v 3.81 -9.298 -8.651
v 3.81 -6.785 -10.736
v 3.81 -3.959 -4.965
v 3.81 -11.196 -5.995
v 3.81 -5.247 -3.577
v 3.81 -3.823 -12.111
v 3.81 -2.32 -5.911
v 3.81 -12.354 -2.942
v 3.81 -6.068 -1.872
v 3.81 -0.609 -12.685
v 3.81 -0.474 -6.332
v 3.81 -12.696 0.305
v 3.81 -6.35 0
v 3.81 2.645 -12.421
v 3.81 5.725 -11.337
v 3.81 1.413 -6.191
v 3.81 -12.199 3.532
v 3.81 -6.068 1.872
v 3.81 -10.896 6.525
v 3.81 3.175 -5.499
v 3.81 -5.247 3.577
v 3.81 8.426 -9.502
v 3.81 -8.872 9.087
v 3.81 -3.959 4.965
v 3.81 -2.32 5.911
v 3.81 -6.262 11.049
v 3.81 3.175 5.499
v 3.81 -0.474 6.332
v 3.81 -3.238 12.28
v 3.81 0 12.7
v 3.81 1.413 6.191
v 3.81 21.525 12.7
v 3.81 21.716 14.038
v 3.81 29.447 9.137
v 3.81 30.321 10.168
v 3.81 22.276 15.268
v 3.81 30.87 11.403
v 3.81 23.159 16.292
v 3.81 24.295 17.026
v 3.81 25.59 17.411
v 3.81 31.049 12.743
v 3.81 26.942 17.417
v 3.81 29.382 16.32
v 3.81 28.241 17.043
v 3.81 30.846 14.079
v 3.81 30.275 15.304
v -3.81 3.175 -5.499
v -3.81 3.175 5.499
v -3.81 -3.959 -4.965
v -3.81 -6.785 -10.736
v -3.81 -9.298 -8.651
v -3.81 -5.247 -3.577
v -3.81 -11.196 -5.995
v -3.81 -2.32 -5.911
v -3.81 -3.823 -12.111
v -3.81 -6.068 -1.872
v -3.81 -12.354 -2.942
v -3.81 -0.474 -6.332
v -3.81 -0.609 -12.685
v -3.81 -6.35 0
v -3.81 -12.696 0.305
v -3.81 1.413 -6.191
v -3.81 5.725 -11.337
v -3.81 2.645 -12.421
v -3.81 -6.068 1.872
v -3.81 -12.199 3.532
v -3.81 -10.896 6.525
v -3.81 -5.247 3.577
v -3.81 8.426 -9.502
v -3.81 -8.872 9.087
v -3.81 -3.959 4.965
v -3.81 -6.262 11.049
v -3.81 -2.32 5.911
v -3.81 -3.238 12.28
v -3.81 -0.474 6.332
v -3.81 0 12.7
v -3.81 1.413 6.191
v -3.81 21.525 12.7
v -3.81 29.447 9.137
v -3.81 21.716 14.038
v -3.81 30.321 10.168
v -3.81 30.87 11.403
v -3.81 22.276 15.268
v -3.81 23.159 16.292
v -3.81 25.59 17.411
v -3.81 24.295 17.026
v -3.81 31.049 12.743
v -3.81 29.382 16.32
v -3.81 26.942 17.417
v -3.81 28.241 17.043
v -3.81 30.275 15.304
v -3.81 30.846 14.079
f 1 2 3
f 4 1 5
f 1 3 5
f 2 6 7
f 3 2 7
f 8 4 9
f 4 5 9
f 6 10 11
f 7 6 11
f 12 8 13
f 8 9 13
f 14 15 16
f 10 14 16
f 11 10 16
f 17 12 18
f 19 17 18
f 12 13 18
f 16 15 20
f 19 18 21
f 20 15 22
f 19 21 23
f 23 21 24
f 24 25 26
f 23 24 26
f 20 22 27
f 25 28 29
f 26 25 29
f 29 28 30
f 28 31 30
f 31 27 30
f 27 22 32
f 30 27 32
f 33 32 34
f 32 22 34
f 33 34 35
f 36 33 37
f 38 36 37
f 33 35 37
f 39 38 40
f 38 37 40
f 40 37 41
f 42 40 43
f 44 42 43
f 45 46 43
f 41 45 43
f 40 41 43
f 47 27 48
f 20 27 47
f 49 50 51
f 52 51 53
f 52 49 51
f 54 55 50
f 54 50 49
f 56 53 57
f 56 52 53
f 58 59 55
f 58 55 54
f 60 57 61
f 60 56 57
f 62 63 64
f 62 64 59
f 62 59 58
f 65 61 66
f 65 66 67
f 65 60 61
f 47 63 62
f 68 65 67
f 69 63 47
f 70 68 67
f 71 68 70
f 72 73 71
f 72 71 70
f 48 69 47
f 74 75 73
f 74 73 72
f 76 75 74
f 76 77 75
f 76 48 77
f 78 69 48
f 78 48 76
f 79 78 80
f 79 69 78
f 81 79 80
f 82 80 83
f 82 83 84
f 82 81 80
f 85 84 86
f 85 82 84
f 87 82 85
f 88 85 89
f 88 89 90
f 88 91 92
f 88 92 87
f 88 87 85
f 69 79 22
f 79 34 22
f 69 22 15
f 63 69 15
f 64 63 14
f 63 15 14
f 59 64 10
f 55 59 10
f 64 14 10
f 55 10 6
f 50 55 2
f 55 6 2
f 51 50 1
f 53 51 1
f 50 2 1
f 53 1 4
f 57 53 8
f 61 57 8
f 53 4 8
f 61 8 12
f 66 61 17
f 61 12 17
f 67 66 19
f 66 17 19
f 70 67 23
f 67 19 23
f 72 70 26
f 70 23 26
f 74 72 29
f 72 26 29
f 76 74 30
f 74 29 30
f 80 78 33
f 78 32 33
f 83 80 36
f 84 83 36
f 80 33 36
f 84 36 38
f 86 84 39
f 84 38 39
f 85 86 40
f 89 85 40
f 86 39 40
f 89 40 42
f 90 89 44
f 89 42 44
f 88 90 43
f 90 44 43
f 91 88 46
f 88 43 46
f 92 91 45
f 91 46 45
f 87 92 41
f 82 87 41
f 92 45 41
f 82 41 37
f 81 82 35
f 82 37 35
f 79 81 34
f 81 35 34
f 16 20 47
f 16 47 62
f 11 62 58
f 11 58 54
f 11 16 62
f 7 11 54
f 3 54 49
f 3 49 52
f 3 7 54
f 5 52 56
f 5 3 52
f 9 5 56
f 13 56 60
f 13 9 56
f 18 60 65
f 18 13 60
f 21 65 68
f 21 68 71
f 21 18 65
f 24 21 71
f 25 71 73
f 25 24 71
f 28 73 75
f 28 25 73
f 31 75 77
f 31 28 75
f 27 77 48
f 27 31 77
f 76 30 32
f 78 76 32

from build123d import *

# Parameters (mm, degrees)
BOSS_EXTRUDE1_DEPTH = 3.81


with BuildPart() as part:
    # Sketch1 → Boss-Extrude1 (new, symmetric)
    with BuildSketch(Plane(origin=(0, 0, 0), x_dir=(0, 0, -1), z_dir=(1, 0, 0))):
        with BuildLine():
            Line((-12.7, 0), (-12.7, 21.524540775))
            ThreePointArc((-12.7, 21.524540775), (-17.043342208, 28.240700088), (-9.136572828, 29.446691553))
            Line((-9.136572828, 29.446691553), (9.502472459, 8.425735408))
            ThreePointArc((9.502472459, 8.425735408), (4.506029281, -11.873739938), (-12.7, 0))
        make_face()
        with BuildLine():
            Line((-5.4991, 3.175279388), (5.4991, 3.175279388))
            ThreePointArc((5.4991, 3.175279388), (0, -6.35), (-5.4991, 3.175279388))
        make_face(mode=Mode.SUBTRACT)
    extrude(amount=BOSS_EXTRUDE1_DEPTH, both=True)


solid = part.part
